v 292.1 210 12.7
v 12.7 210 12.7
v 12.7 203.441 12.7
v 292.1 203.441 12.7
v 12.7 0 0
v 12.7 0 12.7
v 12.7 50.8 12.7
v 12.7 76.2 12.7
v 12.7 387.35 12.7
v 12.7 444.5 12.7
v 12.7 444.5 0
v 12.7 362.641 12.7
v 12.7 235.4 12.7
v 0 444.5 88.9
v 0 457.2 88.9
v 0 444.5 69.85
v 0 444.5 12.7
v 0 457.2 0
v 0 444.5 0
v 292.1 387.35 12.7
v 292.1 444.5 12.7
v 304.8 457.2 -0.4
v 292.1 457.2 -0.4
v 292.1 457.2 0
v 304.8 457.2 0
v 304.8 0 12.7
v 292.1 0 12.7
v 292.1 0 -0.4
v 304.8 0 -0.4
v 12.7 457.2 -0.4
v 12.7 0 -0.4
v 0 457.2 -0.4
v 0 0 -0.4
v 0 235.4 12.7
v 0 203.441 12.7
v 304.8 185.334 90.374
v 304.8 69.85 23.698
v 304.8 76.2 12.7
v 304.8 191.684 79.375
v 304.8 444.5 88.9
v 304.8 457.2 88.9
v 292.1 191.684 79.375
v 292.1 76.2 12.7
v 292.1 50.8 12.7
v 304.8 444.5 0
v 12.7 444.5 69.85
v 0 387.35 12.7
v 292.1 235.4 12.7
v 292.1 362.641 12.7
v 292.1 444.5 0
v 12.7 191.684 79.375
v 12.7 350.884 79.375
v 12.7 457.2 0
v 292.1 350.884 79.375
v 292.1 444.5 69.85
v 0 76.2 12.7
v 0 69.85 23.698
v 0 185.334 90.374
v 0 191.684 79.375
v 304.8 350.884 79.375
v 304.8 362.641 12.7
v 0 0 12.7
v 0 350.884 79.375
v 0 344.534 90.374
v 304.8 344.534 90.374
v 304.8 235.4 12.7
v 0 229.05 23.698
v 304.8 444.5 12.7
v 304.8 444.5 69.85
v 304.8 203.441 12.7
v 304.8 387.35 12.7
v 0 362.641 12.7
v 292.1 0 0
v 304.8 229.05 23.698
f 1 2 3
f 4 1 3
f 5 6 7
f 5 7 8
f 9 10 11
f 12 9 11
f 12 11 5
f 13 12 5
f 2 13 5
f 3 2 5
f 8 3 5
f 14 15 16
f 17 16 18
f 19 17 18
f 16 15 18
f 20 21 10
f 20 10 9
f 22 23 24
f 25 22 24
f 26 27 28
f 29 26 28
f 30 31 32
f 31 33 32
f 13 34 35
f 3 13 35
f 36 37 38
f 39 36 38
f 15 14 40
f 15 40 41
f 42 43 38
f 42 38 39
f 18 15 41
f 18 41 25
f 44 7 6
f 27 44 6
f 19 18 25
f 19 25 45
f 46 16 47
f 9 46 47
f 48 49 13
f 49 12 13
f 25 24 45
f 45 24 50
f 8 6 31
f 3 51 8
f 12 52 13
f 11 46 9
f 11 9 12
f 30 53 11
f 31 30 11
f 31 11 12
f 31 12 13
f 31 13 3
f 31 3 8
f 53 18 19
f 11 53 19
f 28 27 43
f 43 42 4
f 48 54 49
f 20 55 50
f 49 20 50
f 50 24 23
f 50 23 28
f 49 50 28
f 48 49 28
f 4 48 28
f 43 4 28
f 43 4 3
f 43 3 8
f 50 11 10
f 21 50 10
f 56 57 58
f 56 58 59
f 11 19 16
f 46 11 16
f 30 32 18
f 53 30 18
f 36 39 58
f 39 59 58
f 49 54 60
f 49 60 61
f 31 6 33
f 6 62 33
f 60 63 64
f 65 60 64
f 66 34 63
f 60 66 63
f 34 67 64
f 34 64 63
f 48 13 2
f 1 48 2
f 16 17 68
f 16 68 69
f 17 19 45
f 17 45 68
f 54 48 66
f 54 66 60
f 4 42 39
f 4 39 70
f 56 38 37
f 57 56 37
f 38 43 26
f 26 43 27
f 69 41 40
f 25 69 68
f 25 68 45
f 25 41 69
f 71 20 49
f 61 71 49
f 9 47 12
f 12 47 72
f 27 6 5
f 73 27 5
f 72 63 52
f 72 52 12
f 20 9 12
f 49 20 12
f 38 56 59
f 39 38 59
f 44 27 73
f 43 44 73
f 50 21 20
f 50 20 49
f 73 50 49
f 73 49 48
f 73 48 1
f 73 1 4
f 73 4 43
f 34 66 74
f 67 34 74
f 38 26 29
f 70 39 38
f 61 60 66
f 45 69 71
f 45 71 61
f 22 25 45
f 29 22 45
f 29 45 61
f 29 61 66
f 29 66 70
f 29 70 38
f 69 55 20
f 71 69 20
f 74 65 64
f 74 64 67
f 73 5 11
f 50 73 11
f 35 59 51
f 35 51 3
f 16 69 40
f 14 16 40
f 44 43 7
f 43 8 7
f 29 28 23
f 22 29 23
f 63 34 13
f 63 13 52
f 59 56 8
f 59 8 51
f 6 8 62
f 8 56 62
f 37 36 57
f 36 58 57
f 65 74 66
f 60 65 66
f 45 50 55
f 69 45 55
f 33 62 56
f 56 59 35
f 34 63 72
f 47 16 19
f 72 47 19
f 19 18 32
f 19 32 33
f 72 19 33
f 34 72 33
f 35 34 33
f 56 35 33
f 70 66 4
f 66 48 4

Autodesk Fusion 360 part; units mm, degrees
sketch "Sketch1" plane through (0, 0, 0) normal (1, 0, 0) x (0, 0, -1)
  line L0 (0, 0) -> (0, 444.5)
  line L1 (0, 444.5) -> (-12.7, 444.5)
  line L2 (-12.7, 444.5) -> (-12.7, 0)
  line L3 (-12.7, 0) -> (0, 0)
  line L4 (0, 444.5) -> (-88.9, 444.5)
  line L5 (-88.9, 444.5) -> (-88.9, 457.2)
  line L6 (-88.9, 457.2) -> (0, 457.2)
  line L7 (0, 457.2) -> (0, 444.5)
  line L8 (-69.85, 444.5) -> (-12.7, 387.35)
  line L9 (-12.7, 76.2) -> (-79.375, 191.6845)
  line L10 (-79.375, 191.6845) -> (-12.7, 203.4411)
  line L11 (-12.7, 235.4) -> (-79.375, 350.8845)
  line L12 (-79.375, 350.8845) -> (-12.7, 362.6411)
  line L13 (-79.375, 191.6845) -> (-90.3735, 185.3345)
  line L14 (-90.3735, 185.3345) -> (-12.7, 50.8)
  line L15 (-79.375, 350.8845) -> (-90.3735, 344.5345)
  line L16 (-90.3735, 344.5345) -> (-12.7, 210)
  line L17 (-12.7, 76.2) -> (-23.6985, 69.85)
  line L18 (-12.7, 235.4) -> (-23.6985, 229.05)
  line L19 (0, 0) -> (0.4, 0)
  line L20 (0.4, 0) -> (0.4, 457.2)
  line L21 (0.4, 457.2) -> (0, 457.2)
  dimension "d5" = 12.7
  dimension "d6" = 457.2
  dimension "d7" = 12.7
  dimension "d8" = 88.9
  dimension "d9" = 45
  dimension "d10" = 19.05
  dimension "d11" = 30
  dimension "d12" = 80
  dimension "d13" = 12.7
  dimension "d15" = 133.35
  dimension "d16" = 50.8
  dimension "d17" = 210
  dimension "d100" = 0.4
extrude "Extrude1" add sketch "Sketch1" along normal blind 12.7 contours L0 L1 L2 L3 L4 | L0 L7 L19 L20 L21 | L2 L4 L8 | L2 L9 L10 | L2 L11 L12 makes body 1 in component "Left End"
extrude "Extrude1'" add sketch "Sketch1" along normal blind 279.4 from surface at 12.7 separate body contours L0 L1 L2 L3 L4 makes body 2 in component "Back"
extrude "Extrude1''" add sketch "Sketch1" along normal blind 12.7 from surface at 292.1 separate body contours L0 L1 L2 L3 L4 | L0 L7 L19 L20 L21 | L2 L4 L8 | L2 L9 L10 | L2 L11 L12 makes body 3 in component "Right End"
extrude "Extrude1'''" add sketch "Sketch1" along normal blind 304.8 separate body contours L1 L4 L5 L6 L7 makes body 4 in component "Shelf"
extrude "Extrude1''''" add sketch "Sketch1" along normal blind 304.8 separate body contours L11 L15 L16 L18 makes body 5 in component "Top Cubbie"
extrude "Extrude1'''''" add sketch "Sketch1" along normal blind 304.8 separate body contours L9 L13 L14 L17 makes body 6 in component "Bottom Cubbie"
component "Left End" placed x (1, 0, 0) y (0, 1, 0) z (0, 0, 1) at (0, 0, 0)
component "Back" placed x (1, 0, 0) y (0, 1, 0) z (0, 0, 1) at (0, 0, 0)
component "Right End" placed x (1, 0, 0) y (0, 1, 0) z (0, 0, 1) at (0, 0, 0)
component "Shelf" placed x (1, 0, 0) y (0, 1, 0) z (0, 0, 1) at (0, 0, 0)
component "Top Cubbie" placed x (1, 0, 0) y (0, 1, 0) z (0, 0, 1) at (0, 0, 0)
component "Bottom Cubbie" placed x (1, 0, 0) y (0, 1, 0) z (0, 0, 1) at (0, 0, 0)
equation "Ply1 = 18 mm" comment "3/4\" Plywood thickness"
equation "Height = 18 in"
equation "Width = 12 in"
equation "Ply2 = 12.7 mm" comment "1/2\" Plywood thickness"
equation "d5 = Ply2"
equation "d6 = Height"
equation "d7 = Ply2"
equation "d13 = Ply2"
equation "d18 = Ply2"
equation "Dado = 6.35 mm" comment "Dado Depth"
equation "Clr = 0.4 mm" comment "Clearance Distance"
equation "d29 = Width - ( 2 * Ply2 )"
equation "d32 = Ply2"
equation "d34 = Width"
equation "d36 = Width"
equation "d38 = Width"
equation "d100 = Clr"
